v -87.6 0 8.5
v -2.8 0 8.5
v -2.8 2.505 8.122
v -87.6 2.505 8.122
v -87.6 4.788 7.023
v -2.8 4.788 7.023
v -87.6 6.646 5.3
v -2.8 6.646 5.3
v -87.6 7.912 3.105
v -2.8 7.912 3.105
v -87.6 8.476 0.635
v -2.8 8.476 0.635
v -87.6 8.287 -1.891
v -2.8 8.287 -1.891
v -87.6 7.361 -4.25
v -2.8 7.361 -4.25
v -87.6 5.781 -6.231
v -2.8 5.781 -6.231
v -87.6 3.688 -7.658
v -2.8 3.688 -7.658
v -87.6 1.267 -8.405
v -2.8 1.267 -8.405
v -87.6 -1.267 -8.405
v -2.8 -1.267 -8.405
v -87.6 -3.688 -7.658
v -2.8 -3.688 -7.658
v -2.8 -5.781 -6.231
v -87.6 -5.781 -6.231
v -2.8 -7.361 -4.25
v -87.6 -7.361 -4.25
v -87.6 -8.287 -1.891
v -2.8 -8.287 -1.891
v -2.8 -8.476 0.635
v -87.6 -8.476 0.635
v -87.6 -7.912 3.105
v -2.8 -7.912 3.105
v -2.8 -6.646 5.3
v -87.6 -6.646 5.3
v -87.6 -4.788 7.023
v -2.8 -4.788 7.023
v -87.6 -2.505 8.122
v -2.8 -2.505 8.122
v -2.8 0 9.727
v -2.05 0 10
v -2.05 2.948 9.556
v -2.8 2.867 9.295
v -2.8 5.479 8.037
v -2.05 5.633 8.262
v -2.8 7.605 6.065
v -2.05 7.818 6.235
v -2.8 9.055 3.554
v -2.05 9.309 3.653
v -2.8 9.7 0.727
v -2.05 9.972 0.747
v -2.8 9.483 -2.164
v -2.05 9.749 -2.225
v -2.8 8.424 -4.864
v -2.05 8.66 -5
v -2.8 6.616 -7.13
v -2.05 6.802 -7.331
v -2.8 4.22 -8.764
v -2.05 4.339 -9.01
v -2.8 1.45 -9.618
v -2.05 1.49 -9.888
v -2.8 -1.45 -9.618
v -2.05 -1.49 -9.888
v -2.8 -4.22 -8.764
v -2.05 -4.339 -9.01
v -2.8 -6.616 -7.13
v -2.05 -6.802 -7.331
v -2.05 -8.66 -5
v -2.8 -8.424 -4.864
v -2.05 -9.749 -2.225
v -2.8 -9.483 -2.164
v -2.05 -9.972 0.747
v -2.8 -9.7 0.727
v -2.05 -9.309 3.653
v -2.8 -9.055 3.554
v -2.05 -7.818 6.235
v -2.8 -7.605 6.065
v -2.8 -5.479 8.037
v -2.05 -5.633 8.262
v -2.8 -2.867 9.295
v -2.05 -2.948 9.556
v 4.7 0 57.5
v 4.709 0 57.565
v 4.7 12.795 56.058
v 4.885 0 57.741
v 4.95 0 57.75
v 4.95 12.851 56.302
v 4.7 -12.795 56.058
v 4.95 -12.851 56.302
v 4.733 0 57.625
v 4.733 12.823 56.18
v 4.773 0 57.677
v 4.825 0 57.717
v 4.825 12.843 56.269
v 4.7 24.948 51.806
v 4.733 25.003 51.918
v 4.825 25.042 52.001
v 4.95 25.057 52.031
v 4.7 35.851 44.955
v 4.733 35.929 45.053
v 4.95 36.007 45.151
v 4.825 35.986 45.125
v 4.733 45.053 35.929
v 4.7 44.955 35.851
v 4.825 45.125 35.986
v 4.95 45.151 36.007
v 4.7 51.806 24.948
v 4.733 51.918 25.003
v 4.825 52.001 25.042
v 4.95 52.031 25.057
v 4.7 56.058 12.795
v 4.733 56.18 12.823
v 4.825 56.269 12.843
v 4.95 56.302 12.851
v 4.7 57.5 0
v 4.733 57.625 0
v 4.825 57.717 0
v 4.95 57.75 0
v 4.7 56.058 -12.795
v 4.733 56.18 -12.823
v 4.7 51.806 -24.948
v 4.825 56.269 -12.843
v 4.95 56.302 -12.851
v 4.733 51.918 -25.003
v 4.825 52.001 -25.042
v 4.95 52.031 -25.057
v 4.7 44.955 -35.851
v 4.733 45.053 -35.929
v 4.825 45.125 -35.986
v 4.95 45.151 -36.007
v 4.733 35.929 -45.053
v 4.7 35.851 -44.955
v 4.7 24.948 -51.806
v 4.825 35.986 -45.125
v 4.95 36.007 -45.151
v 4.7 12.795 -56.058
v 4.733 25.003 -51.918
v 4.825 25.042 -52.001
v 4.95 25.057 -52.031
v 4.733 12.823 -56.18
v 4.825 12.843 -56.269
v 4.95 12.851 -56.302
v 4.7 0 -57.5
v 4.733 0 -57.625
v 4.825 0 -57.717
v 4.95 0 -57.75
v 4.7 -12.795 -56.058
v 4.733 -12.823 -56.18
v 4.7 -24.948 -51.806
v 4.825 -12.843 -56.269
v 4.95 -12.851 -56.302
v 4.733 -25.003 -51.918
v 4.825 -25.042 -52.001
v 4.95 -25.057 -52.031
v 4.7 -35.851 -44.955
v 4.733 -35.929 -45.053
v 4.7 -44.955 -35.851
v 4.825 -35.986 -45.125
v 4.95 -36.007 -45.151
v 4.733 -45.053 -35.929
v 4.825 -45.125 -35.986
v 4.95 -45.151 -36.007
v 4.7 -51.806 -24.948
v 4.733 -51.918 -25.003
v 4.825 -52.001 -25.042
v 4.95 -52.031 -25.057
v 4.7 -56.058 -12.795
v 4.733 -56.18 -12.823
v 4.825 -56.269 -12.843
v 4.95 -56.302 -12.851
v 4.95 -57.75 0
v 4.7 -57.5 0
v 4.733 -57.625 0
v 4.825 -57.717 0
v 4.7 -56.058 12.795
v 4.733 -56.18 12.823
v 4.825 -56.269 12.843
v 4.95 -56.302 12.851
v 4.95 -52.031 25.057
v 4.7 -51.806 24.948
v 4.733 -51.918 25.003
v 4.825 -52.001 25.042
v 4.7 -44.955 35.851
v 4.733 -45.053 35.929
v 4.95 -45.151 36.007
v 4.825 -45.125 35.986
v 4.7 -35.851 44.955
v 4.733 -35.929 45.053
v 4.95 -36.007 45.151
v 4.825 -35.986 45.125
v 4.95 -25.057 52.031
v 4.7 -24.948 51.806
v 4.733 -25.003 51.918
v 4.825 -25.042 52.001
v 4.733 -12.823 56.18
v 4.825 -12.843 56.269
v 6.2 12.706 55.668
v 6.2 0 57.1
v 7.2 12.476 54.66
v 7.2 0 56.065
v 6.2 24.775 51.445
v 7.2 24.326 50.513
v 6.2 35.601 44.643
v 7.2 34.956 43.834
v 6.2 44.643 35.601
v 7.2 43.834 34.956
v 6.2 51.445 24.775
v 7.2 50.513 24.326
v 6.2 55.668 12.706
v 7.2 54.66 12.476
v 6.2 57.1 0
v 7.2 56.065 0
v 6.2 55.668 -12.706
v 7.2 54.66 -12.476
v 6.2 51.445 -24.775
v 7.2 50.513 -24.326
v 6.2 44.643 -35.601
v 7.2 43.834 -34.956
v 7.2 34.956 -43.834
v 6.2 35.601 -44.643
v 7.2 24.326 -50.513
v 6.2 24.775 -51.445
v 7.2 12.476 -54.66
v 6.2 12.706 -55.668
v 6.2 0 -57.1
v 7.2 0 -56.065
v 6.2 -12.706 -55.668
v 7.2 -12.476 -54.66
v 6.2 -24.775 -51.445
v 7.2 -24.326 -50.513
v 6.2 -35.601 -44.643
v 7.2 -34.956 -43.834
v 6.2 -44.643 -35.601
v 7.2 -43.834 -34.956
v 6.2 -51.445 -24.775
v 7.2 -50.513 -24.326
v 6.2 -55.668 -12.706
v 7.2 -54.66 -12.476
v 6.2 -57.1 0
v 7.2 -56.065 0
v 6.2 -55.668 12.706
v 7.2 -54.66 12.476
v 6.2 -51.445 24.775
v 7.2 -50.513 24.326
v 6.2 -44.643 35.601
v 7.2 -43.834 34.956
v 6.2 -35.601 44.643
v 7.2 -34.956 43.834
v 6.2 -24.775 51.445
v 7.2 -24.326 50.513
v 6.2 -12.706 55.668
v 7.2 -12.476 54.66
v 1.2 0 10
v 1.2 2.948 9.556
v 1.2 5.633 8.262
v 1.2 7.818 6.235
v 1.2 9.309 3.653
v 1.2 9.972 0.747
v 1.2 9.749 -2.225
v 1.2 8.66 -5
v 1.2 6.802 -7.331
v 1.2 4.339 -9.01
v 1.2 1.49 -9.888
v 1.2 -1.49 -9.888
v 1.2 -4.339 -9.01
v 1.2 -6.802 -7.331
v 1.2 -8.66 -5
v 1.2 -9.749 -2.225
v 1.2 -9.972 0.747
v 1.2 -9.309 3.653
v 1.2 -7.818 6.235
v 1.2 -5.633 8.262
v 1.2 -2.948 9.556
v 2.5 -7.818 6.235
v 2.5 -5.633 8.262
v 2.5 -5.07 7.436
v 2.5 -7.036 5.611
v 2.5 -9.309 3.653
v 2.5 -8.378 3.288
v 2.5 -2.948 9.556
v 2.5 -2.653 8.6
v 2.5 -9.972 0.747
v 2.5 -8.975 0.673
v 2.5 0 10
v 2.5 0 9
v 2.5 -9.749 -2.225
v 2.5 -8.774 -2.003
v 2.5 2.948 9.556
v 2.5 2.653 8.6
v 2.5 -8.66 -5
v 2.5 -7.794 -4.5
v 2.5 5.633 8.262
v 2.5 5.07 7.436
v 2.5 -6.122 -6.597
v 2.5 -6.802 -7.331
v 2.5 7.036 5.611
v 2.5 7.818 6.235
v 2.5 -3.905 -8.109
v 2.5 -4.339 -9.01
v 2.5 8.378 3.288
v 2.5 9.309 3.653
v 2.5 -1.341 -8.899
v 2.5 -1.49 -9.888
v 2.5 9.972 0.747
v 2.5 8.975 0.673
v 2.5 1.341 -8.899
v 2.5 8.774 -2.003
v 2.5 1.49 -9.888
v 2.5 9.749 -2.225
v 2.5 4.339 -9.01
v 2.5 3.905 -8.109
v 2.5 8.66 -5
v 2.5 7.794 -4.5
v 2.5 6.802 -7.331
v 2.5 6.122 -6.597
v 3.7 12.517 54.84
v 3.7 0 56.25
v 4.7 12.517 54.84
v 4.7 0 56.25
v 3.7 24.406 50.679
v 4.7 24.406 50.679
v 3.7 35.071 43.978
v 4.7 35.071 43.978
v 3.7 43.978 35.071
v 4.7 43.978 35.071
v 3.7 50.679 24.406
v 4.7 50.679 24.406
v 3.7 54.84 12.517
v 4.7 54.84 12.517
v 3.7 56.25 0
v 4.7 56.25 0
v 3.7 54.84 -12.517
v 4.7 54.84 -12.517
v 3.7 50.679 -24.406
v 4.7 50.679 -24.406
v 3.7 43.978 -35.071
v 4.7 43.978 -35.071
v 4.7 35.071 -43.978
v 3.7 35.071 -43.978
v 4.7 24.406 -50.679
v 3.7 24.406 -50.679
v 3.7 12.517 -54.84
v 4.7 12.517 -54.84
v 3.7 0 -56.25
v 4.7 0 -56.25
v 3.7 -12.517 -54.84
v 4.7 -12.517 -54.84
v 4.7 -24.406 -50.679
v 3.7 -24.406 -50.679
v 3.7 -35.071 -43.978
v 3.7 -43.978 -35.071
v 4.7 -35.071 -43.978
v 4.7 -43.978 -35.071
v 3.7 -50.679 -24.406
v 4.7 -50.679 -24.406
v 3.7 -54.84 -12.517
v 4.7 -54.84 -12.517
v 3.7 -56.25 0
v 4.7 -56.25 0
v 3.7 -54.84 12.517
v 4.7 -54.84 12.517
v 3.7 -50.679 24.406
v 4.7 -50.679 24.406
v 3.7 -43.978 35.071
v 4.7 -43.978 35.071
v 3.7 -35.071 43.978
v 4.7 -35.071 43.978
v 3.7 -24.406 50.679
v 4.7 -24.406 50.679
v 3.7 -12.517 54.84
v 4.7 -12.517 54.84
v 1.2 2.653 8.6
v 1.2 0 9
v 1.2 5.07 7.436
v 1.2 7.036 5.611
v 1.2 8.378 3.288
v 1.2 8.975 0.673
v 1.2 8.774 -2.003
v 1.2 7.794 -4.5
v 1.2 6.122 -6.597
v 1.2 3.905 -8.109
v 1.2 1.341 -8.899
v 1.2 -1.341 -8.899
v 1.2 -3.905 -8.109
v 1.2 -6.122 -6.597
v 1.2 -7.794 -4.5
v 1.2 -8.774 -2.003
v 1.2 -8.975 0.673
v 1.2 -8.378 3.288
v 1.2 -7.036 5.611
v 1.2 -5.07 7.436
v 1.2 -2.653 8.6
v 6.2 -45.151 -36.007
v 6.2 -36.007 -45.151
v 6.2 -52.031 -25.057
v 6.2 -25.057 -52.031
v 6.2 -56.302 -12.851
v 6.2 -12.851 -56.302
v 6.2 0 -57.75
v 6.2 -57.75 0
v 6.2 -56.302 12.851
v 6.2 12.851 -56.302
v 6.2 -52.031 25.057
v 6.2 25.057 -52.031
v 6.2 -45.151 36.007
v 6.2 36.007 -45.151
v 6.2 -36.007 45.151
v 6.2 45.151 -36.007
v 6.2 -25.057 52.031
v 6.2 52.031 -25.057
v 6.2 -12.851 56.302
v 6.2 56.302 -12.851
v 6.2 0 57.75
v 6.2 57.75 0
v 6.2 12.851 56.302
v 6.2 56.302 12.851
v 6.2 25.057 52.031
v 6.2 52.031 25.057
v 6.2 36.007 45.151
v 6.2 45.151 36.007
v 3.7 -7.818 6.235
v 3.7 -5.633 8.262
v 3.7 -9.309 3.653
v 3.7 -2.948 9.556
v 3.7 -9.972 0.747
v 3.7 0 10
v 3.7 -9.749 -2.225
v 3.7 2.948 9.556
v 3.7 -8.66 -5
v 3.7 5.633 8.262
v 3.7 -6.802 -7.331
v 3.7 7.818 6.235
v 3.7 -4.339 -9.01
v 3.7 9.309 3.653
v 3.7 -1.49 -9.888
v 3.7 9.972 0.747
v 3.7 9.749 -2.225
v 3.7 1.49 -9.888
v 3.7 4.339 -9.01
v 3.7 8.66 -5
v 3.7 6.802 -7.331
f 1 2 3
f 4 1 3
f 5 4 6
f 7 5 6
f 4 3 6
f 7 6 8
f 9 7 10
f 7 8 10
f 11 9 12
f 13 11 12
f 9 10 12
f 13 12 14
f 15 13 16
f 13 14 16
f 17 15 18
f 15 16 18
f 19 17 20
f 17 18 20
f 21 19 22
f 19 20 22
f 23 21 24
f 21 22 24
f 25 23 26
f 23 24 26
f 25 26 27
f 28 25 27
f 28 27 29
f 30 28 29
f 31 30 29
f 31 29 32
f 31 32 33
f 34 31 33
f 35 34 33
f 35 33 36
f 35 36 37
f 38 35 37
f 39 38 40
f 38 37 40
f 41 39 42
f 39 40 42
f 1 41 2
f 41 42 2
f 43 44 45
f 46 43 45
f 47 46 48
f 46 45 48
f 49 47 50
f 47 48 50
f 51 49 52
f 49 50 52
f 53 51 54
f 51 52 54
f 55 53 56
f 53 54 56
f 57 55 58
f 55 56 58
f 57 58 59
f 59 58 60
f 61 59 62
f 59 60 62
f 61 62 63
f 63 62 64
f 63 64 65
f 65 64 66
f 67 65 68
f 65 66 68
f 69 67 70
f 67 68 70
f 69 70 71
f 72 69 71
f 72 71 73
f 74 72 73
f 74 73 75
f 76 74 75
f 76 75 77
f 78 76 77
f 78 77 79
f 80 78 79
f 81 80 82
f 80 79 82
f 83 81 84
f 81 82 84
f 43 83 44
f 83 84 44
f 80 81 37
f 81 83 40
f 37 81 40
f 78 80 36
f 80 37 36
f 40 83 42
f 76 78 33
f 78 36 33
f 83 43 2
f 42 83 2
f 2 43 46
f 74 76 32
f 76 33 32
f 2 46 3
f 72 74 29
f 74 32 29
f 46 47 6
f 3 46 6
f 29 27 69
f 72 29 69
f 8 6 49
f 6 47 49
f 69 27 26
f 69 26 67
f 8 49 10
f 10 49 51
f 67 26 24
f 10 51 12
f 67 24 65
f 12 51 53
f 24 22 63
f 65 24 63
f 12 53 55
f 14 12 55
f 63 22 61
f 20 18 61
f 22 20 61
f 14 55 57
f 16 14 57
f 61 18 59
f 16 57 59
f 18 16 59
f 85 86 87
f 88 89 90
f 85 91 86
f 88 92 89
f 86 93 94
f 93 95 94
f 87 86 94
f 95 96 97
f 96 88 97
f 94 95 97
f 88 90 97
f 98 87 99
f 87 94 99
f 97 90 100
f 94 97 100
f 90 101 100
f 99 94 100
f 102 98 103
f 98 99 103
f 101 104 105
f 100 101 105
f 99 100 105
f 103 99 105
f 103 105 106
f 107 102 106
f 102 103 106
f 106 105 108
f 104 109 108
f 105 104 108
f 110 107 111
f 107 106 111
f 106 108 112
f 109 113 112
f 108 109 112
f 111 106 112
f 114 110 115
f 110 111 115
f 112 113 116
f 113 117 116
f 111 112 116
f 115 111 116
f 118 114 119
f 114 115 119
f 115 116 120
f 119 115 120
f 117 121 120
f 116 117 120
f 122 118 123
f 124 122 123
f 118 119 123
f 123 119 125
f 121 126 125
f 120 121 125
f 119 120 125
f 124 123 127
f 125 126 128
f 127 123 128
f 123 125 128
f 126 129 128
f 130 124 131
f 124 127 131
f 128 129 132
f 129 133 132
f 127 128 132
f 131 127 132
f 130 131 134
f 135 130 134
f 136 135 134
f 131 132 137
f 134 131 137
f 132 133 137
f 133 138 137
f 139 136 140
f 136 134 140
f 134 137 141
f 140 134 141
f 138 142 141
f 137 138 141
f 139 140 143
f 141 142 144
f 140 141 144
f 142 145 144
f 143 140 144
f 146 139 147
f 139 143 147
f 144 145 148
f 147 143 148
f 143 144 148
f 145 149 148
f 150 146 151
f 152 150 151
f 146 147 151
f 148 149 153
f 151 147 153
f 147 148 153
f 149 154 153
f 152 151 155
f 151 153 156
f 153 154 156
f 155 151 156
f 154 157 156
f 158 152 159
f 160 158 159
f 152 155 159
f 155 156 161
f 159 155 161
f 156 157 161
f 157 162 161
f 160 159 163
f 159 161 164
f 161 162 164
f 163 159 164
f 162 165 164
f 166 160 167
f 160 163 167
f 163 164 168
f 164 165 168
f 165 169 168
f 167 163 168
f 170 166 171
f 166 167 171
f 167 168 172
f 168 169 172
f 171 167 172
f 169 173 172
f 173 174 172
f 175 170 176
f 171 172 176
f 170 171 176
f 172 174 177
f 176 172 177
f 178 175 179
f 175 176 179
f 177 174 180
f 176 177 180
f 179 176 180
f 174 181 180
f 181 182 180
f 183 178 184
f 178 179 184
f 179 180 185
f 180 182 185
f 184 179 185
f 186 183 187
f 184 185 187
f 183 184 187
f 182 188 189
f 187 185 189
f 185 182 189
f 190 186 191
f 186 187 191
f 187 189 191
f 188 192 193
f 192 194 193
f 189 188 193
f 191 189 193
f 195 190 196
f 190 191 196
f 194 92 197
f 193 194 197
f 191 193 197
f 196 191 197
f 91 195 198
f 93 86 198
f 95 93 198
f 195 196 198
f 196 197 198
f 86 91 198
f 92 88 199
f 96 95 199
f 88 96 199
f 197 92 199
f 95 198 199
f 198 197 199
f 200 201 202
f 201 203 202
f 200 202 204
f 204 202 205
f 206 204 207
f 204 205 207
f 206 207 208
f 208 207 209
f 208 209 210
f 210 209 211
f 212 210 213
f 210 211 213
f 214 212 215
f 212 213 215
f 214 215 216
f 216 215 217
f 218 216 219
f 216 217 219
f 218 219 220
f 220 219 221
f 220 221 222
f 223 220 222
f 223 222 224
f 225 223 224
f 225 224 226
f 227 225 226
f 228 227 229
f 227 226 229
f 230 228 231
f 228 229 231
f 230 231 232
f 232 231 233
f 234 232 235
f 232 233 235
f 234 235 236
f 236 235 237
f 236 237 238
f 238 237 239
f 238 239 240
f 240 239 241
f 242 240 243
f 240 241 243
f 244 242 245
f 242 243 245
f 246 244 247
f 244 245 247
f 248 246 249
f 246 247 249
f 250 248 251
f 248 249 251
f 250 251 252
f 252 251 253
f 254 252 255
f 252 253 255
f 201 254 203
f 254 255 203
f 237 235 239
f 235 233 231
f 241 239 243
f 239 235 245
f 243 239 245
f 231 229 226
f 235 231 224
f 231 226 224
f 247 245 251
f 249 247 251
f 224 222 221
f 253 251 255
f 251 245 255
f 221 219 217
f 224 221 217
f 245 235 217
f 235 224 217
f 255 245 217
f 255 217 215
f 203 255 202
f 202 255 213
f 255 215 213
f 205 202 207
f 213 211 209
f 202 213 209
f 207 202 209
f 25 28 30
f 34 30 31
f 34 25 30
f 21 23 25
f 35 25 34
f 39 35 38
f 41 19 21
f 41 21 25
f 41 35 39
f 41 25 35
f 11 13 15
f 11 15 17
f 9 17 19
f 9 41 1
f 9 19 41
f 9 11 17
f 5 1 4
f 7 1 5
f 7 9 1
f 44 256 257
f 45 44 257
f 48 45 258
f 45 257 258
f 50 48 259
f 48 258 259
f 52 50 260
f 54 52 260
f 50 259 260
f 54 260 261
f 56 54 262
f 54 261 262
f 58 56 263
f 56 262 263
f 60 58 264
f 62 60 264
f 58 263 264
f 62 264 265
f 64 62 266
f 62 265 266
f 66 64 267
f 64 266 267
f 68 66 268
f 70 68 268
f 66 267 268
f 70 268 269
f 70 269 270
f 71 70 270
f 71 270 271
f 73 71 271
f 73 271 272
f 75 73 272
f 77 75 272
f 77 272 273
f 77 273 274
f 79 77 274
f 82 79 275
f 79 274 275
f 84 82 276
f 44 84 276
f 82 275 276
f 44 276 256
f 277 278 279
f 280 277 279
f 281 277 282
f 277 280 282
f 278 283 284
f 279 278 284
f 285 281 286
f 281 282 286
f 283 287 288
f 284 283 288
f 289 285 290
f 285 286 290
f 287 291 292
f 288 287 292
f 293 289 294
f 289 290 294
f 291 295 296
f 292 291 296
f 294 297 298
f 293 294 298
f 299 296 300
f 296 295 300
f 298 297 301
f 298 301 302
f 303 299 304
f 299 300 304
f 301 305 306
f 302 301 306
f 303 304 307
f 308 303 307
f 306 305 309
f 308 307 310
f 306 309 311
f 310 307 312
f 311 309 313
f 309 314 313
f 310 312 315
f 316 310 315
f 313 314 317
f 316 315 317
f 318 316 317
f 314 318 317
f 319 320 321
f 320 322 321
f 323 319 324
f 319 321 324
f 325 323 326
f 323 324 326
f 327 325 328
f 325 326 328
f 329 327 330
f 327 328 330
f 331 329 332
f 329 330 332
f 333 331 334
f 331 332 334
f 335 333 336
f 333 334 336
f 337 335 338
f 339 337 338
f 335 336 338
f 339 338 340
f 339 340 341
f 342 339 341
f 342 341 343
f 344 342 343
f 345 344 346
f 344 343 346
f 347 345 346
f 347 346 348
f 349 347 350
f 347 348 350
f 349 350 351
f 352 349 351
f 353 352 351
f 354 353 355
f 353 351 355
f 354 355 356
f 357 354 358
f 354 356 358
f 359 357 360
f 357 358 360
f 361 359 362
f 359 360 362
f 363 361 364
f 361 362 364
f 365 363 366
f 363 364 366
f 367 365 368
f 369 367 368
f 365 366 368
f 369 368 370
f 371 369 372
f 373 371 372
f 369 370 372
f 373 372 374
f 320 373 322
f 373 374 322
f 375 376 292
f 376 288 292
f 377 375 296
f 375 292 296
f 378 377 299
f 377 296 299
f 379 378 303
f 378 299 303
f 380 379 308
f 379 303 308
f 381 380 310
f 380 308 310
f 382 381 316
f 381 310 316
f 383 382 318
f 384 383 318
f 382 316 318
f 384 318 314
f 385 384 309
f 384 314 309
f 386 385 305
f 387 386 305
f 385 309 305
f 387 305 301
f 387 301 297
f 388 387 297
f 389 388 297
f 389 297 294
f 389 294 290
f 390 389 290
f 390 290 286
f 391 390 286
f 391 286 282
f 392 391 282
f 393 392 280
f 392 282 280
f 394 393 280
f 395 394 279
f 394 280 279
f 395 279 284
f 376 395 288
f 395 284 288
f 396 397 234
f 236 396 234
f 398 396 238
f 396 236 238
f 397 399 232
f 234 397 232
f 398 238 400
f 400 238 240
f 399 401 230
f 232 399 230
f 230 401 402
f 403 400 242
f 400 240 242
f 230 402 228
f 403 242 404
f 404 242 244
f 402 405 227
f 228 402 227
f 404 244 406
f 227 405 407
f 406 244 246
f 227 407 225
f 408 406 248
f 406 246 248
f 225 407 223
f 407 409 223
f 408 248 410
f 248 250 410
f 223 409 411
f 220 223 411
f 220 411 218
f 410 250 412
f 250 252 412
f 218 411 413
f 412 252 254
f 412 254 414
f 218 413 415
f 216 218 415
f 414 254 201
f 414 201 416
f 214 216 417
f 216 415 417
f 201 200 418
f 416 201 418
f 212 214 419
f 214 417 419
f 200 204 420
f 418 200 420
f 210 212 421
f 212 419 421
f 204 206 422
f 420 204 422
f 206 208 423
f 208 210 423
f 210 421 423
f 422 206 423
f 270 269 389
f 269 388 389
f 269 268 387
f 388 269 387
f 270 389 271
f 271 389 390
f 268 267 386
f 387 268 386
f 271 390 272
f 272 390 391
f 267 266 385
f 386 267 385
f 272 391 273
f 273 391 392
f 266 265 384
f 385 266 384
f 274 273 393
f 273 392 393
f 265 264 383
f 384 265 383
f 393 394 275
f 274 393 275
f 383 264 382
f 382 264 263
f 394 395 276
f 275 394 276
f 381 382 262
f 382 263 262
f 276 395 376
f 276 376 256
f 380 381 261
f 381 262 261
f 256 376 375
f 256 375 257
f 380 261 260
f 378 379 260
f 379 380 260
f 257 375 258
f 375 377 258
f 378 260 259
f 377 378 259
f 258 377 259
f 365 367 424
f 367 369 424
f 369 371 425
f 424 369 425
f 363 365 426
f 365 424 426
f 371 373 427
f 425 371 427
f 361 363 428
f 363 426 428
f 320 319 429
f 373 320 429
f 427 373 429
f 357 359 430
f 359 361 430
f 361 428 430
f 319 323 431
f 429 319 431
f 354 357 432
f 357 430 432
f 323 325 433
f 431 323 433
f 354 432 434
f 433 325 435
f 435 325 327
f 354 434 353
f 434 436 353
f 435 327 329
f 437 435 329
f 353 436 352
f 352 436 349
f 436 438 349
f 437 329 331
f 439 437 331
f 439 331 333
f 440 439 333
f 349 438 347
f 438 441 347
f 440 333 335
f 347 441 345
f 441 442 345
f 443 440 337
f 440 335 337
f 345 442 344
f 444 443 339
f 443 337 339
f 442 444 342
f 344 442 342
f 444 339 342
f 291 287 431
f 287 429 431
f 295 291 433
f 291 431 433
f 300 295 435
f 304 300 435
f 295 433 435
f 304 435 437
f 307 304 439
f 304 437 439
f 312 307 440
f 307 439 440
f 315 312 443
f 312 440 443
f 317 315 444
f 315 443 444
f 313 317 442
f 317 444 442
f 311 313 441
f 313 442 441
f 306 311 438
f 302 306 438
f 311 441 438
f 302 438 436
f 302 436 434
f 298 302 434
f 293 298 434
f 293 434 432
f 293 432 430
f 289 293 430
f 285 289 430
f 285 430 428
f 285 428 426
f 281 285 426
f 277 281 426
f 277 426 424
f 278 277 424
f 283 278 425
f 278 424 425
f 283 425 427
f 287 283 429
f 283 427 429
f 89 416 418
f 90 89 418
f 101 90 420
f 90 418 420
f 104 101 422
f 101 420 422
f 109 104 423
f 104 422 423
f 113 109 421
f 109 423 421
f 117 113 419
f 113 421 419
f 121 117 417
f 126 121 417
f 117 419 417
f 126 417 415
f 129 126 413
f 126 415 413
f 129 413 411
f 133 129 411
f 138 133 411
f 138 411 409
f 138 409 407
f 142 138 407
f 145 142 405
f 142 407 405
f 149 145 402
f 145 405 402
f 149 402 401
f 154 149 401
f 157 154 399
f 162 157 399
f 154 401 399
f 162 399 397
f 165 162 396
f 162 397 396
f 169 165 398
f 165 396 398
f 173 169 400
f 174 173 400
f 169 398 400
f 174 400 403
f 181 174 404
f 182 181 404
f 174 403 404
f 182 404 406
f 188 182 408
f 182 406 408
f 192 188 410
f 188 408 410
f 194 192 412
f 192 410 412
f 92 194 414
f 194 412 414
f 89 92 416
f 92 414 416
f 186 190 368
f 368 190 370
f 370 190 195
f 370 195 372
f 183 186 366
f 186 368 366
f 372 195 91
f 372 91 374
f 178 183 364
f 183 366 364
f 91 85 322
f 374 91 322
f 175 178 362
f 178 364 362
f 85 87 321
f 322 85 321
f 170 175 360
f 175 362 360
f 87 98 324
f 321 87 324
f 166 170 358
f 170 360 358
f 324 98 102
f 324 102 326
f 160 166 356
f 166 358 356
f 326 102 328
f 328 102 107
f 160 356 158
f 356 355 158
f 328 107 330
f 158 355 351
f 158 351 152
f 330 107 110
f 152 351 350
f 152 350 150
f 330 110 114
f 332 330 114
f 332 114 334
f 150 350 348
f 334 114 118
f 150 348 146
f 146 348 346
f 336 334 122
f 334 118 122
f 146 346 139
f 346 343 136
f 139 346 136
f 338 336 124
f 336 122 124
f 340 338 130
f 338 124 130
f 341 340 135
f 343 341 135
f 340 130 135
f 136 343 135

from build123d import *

# Parameters (mm, degrees)
SKETCH4_R           = 8.5
BOSS_EXTRUDE2_DEPTH = 84.8
CHAMFER2_SIZE       = 0.272977676
CHAMFER2_SIZE2      = 0.75
FILLET1_R           = 0.25


with BuildPart() as part:
    # Sketch1 → Revolve1 (revolve)
    with BuildSketch(Plane(origin=(0, 0, 0), x_dir=(-1, 0, 0), z_dir=(0, 0, -1)), mode=Mode.PRIVATE) as revolve1_sk:
        Polygon((-7.2, 56.065405665), (-7.2, 0), (2.8, 0), (2.8, 10), (-1.2, 10), (-1.2, 9), (-2.5, 9), (-2.5, 10), (-3.7, 10), (-3.7, 56.25), (-4.7, 56.25), (-4.7, 57.75), (-6.2, 57.75), (-6.2, 57.1), align=None)
    revolve(revolve1_sk.sketch.rotate(Axis((7.200025, 0, 0), (-1, 0, 0)), 270), axis=Axis((7.200025, 0, 0), (-1, 0, 0)))

    # Sketch4 → Boss-Extrude2 (add)
    with BuildSketch(Plane.ZY.offset(2.8)):
        Circle(SKETCH4_R)
    extrude(amount=BOSS_EXTRUDE2_DEPTH)

    # Chamfer2
    chamfer2_edges = [part.edges().sort_by_distance(p)[0] for p in [
        (-2.8, 0, -10),
    ]]
    chamfer2_side = [part.faces().sort_by_distance(p)[0] for p in [
        (-2.8, 0, -9.717157288),
    ]]
    chamfer(chamfer2_edges, length=CHAMFER2_SIZE, length2=CHAMFER2_SIZE2, reference=chamfer2_side[0])

    # Fillet1
    fillet1_edges = [part.edges().sort_by_distance(p)[0] for p in [
        (4.7, 0, -57.75),
    ]]
    fillet(fillet1_edges, radius=FILLET1_R)


solid = part.part
